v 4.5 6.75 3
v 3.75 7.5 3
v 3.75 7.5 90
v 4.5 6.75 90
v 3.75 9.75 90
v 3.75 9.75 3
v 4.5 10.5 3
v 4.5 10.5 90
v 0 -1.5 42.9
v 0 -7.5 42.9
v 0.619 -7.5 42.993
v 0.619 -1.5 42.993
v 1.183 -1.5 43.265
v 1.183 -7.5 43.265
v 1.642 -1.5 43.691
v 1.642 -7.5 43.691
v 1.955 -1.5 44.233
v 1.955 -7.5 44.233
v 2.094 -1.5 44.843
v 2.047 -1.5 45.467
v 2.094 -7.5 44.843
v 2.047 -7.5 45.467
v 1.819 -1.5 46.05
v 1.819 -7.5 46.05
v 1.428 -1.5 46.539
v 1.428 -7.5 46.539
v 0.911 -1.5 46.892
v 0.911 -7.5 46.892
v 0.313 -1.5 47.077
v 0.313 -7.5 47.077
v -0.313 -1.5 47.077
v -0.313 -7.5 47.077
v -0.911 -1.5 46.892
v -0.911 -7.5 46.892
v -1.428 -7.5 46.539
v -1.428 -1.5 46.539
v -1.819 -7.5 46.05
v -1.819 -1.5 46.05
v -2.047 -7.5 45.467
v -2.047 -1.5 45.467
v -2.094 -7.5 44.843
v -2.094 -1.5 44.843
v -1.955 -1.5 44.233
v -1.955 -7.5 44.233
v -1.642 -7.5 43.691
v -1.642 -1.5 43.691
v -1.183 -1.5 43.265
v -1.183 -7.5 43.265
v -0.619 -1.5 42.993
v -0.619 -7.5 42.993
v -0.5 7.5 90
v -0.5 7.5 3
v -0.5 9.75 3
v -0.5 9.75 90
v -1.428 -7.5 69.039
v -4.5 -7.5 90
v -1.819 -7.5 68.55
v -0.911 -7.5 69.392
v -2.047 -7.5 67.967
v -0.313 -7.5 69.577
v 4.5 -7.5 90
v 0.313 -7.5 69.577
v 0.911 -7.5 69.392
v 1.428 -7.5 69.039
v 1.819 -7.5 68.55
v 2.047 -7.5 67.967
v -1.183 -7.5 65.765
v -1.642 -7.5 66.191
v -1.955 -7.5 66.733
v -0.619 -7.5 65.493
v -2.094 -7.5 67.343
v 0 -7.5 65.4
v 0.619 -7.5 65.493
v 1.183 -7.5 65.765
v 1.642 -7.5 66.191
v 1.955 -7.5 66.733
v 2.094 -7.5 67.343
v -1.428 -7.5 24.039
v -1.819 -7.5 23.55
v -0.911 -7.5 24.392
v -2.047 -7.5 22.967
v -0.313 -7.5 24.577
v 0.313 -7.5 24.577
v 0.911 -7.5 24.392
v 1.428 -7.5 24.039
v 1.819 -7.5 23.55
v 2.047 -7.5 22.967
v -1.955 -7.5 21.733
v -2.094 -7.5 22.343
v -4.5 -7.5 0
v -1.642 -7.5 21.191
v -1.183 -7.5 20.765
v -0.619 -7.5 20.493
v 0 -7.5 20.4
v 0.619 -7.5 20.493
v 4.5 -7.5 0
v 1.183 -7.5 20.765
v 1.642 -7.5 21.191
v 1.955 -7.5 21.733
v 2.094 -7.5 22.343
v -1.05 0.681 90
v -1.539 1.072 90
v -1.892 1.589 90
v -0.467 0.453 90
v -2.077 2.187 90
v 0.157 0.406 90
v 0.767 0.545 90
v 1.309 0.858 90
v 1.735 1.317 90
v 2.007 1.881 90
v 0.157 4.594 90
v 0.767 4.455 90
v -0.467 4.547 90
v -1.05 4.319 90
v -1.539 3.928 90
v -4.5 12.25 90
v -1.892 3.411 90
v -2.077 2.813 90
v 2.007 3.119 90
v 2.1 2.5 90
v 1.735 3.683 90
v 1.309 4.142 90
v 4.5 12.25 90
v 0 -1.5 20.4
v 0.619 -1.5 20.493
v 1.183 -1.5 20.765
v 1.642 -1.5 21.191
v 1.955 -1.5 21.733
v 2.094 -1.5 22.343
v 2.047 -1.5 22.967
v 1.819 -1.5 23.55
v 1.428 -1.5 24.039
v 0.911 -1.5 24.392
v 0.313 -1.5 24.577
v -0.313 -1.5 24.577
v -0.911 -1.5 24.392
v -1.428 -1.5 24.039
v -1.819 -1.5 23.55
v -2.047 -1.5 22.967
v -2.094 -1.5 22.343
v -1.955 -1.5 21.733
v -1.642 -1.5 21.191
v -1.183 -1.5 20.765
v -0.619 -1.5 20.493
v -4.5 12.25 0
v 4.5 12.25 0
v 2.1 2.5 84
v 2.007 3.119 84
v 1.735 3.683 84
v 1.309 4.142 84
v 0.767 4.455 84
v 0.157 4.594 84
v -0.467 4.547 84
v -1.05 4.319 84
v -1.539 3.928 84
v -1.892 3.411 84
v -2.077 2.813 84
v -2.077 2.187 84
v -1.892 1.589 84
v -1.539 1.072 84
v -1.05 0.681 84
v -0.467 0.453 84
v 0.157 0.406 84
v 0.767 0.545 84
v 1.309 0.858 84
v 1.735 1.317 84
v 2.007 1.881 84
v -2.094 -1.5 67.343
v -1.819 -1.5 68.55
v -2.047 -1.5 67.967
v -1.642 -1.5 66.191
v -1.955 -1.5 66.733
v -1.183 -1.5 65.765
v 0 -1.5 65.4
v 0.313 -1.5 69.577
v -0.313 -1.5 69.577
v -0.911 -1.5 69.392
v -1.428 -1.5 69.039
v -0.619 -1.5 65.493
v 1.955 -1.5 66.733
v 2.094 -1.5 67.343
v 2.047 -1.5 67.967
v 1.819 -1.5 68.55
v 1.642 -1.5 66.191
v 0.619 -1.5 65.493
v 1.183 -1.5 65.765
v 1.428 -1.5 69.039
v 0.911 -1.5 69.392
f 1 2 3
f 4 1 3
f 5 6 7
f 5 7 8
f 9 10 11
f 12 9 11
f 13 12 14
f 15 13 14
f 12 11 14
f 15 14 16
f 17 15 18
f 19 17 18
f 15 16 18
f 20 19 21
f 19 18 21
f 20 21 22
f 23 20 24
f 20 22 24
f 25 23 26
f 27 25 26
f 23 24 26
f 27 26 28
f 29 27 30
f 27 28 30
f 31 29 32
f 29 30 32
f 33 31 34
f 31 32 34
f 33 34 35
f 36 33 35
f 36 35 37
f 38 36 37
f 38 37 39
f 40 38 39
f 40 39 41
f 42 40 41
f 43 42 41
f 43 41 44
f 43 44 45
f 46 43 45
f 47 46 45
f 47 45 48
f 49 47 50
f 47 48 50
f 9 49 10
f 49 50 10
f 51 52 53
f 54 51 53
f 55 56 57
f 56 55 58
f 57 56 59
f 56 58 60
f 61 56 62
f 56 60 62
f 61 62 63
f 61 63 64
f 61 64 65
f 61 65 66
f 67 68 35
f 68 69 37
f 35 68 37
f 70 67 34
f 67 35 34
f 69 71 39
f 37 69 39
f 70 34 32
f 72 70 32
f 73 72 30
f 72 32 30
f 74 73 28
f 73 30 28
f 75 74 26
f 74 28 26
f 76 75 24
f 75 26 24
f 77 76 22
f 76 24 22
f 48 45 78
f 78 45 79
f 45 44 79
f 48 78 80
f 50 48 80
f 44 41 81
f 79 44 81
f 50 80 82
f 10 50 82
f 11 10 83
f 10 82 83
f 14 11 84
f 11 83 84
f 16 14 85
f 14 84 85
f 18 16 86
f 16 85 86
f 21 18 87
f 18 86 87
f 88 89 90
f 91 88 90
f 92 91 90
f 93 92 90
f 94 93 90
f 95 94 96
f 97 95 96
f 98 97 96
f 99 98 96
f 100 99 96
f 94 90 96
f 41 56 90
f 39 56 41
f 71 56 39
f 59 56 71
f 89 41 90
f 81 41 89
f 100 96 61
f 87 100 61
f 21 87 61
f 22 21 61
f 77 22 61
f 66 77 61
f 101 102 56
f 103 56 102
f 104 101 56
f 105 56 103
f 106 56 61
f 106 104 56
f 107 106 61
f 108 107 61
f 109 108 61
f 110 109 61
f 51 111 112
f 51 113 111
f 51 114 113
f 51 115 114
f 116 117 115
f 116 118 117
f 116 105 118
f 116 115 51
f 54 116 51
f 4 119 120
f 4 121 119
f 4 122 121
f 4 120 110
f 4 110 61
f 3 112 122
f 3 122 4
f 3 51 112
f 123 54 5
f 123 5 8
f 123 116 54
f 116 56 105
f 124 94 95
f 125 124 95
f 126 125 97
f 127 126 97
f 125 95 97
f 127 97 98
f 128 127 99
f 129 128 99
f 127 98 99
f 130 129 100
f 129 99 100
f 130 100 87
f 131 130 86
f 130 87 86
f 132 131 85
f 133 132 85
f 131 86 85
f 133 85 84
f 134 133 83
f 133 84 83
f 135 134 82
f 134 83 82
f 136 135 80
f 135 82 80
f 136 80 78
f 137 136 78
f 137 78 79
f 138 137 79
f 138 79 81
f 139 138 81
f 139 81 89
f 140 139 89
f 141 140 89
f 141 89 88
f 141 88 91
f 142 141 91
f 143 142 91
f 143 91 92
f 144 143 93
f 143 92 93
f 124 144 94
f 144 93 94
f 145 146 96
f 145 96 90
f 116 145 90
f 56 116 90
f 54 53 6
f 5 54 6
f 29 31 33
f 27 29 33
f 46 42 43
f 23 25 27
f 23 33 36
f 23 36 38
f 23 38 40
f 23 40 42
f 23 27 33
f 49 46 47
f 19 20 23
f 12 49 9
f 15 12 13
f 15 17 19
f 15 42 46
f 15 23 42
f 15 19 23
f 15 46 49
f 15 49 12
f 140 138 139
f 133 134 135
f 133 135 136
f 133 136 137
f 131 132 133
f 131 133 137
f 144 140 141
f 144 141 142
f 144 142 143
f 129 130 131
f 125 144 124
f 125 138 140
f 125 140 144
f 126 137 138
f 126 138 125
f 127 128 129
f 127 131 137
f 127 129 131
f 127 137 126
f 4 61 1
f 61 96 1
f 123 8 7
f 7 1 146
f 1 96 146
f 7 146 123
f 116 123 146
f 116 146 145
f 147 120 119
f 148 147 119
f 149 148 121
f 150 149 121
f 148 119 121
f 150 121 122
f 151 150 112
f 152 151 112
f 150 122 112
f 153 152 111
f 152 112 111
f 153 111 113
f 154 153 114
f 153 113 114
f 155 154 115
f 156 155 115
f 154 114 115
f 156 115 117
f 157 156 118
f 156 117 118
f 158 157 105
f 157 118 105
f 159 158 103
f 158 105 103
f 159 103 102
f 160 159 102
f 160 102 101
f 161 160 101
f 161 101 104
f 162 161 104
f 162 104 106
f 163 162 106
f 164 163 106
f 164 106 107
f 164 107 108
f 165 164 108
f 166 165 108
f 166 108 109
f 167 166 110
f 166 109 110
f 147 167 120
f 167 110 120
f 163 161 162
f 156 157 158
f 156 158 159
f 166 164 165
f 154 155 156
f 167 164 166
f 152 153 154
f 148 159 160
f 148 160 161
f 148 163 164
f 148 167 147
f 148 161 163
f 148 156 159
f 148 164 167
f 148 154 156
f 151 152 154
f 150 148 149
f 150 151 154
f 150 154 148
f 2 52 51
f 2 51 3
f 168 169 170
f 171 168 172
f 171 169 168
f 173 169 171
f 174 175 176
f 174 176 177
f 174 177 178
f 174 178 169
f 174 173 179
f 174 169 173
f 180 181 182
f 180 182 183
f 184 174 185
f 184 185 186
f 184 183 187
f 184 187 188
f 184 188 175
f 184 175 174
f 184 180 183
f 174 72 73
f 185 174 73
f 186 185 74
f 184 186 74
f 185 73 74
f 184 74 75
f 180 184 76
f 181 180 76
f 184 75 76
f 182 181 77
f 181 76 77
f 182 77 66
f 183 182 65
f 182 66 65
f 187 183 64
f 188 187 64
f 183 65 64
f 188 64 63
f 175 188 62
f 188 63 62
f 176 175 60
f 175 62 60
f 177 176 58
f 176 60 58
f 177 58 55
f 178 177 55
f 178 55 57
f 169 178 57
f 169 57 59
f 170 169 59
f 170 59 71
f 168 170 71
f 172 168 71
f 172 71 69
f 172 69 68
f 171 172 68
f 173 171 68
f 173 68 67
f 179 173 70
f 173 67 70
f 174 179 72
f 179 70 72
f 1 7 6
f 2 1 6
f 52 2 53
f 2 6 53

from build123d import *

# Parameters (mm, degrees)
SKETCH_1_W          = 9
SKETCH_1_H          = 15
EXTRUDE_1_DEPTH     = 90
SKETCH_2_R          = 2.1
CUT_EXTRUDE_1_DEPTH = 6
SKETCH_3_W          = 5
SKETCH_3_H          = 2.25
EXTRUDE_2_DEPTH     = 3
CHAMFER_1_SIZE      = 0.75
SKETCH_4_R          = 2.1
CUT_EXTRUDE_2_DEPTH = 6


with BuildPart() as part:
    # Эскиз1 → Бобышка-Вытянуть1 (new body)
    with BuildSketch(Plane.XY):
        Rectangle(SKETCH_1_W, SKETCH_1_H)
        Polygon((-4.5, 12.25), (-4.5, 7.5), (-0.5, 7.5), (-0.5, 9.75), (4.5, 9.75), (4.5, 12.25), align=None)
    extrude(amount=EXTRUDE_1_DEPTH)

    # Эскиз2 → Вырез-Вытянуть1 (cut)
    with BuildSketch(Plane.XZ.offset(7.5)):
        with Locations(Location((0, 22.5, 0), (0, 0, 270))):
            Circle(SKETCH_2_R)
        with Locations(Location((0, 67.5, 0), (0, 0, 270))):
            Circle(SKETCH_2_R)
        with Locations(Location((0, 45, 0), (0, 0, 270))):
            Circle(SKETCH_2_R)
    extrude(amount=-CUT_EXTRUDE_1_DEPTH, mode=Mode.SUBTRACT)

    # Эскиз3 → Бобышка-Вытянуть2 (add)
    with BuildSketch(Plane(origin=(0, 0, 0), x_dir=(-1, 0, 0), z_dir=(0, 0, -1))):
        with Locations((-2, 8.625)):
            Rectangle(SKETCH_3_W, SKETCH_3_H)
    extrude(amount=-EXTRUDE_2_DEPTH)

    # Фаска1
    chamfer_1_edges = [part.edges().sort_by_distance(p)[0] for p in [
        (4.5, 9.75, 46.5),
        (4.5, 7.5, 46.5),
    ]]
    chamfer(chamfer_1_edges, length=CHAMFER_1_SIZE)

    # Эскиз4 → Вырез-Вытянуть2 (cut)
    with BuildSketch(Plane.XY.offset(90)):
        with Locations((0, 2.5)):
            Circle(SKETCH_4_R)
    extrude(amount=-CUT_EXTRUDE_2_DEPTH, mode=Mode.SUBTRACT)


solid = part.part
